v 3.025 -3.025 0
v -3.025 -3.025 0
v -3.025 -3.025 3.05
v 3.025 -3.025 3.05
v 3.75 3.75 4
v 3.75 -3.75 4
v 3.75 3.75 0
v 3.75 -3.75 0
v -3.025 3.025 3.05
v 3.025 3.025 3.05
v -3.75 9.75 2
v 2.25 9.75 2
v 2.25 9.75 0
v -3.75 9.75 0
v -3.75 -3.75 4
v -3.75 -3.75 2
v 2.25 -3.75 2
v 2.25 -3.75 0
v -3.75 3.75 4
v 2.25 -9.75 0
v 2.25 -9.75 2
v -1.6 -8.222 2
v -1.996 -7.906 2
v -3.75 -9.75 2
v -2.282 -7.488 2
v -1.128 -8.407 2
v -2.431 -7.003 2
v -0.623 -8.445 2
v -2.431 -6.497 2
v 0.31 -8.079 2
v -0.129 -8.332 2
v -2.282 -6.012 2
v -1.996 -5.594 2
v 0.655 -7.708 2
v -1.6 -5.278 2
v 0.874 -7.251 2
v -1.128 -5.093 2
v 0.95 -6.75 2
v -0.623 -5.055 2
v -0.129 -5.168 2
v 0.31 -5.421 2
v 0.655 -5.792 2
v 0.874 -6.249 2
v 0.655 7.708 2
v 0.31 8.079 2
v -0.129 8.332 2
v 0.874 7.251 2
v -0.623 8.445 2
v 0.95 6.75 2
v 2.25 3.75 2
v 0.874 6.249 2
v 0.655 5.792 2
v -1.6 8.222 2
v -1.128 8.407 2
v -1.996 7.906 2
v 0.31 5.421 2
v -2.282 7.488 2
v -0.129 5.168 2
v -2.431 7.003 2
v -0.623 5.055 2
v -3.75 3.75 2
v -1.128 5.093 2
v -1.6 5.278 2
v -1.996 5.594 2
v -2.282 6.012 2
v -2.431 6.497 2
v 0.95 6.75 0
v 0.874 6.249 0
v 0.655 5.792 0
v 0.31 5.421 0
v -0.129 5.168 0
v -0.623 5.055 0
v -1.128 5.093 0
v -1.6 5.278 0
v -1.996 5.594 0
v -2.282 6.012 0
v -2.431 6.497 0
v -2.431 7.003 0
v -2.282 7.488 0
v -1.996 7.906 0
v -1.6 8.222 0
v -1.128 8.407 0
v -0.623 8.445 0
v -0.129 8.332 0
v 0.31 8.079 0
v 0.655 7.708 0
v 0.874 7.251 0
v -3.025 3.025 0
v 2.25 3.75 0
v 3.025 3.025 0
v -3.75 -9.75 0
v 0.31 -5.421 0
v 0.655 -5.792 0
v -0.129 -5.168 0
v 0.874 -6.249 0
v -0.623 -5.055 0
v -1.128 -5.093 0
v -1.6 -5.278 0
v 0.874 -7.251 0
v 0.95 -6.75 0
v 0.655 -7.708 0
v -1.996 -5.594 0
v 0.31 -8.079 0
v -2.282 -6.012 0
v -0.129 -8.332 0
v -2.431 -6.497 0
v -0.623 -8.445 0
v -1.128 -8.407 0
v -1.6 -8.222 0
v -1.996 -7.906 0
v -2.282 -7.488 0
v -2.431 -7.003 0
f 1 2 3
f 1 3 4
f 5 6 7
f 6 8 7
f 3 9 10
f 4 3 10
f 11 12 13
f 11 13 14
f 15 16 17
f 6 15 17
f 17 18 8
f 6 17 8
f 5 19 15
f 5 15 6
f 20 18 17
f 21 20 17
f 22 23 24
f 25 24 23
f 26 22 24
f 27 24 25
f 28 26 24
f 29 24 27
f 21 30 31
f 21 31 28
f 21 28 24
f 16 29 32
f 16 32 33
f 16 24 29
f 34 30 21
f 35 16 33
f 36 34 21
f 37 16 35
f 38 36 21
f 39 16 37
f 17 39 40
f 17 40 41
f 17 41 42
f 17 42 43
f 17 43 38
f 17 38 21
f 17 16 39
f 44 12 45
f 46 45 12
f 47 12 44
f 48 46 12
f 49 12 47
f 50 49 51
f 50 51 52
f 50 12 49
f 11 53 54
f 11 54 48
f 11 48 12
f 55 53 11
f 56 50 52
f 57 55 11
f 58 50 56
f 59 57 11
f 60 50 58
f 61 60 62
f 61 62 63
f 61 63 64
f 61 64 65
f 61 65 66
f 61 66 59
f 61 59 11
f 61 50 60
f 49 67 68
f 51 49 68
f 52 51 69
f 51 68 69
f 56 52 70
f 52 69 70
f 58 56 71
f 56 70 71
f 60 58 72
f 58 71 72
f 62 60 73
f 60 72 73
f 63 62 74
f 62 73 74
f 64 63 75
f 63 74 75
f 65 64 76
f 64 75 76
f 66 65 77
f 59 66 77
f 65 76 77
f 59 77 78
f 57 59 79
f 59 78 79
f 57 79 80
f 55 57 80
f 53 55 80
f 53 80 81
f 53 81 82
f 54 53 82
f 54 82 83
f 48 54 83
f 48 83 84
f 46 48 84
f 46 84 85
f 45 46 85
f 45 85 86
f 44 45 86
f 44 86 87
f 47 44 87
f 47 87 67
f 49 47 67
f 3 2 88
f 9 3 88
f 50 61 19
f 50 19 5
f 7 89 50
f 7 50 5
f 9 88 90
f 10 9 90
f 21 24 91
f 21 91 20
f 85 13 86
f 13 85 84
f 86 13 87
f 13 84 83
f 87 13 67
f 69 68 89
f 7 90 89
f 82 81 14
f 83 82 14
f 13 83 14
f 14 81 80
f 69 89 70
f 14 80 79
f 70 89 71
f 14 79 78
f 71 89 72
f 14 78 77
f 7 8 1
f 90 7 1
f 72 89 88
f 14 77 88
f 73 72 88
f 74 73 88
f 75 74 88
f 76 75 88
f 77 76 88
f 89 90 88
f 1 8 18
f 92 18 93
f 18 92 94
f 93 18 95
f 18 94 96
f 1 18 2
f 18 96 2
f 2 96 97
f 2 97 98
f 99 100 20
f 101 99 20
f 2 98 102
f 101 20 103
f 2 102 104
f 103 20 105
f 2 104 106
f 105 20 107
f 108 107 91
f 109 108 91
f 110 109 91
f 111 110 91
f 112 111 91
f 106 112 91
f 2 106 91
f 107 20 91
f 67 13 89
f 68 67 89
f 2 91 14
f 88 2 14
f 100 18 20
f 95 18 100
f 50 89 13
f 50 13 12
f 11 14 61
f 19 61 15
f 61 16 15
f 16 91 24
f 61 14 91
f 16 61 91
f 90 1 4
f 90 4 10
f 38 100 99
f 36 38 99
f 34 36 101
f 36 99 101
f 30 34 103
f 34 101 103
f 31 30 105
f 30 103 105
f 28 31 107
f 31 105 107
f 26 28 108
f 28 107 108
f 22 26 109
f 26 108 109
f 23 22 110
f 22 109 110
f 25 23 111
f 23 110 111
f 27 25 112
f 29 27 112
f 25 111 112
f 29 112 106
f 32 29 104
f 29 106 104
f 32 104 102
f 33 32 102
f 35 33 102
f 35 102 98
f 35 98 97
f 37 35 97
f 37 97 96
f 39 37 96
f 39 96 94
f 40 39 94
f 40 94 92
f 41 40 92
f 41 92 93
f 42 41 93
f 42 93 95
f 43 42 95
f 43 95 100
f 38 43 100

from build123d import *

# Parameters (mm, degrees)
SKETCH_W     = 7.5
SKETCH_H     = 7.5
SKETCH_W_2   = 6.05
SKETCH_H_2   = 6.05
PAD_DEPTH    = 3.05
SKETCH001_W  = 7.5
SKETCH001_H  = 7.5
PAD001_DEPTH = 0.95
SKETCH002_W  = 6
SKETCH002_H  = 2
PAD002_DEPTH = 6
SKETCH003_W  = 6
SKETCH003_H  = 2
PAD003_DEPTH = 6
SKETCH004_R  = 1.7
HOLE_DEPTH   = 25


with BuildPart() as part:
    # Sketch → Pad (new body)
    with BuildSketch(Plane.XY):
        Rectangle(SKETCH_W, SKETCH_H)
        Rectangle(SKETCH_W_2, SKETCH_H_2, mode=Mode.SUBTRACT)
    extrude(amount=PAD_DEPTH)

    # Sketch001 (on Face10 of Pad) → Pad001 (join)
    with BuildSketch(Plane.XY.offset(3.05)):
        Rectangle(SKETCH001_W, SKETCH001_H)
    extrude(amount=PAD001_DEPTH)

    # Sketch002 (on Face10 of Pad001) → Pad002 (join)
    with BuildSketch(Plane.XZ.offset(3.75)):
        with Locations((-0.75, 1)):
            Rectangle(SKETCH002_W, SKETCH002_H)
    extrude(amount=PAD002_DEPTH)

    # Sketch003 (on Face3 of Pad002) → Pad003 (join)
    with BuildSketch(Plane(origin=(0, 3.75, 0), x_dir=(-1, 0, 0), z_dir=(0, 1, 0))):
        with Locations((0.75, 1)):
            Rectangle(SKETCH003_W, SKETCH003_H)
    extrude(amount=PAD003_DEPTH)

    # Sketch004 (on Face12 of Pad003) → Hole (cut)
    with BuildSketch(Plane(origin=(0, 0, 0), x_dir=(1, 0, 0), z_dir=(0, 0, -1))):
        with Locations((-0.75, 6.75)):
            Circle(SKETCH004_R)
        with Locations((-0.75, -6.75)):
            Circle(SKETCH004_R)
    extrude(amount=-HOLE_DEPTH, mode=Mode.SUBTRACT)


solid = part.part
